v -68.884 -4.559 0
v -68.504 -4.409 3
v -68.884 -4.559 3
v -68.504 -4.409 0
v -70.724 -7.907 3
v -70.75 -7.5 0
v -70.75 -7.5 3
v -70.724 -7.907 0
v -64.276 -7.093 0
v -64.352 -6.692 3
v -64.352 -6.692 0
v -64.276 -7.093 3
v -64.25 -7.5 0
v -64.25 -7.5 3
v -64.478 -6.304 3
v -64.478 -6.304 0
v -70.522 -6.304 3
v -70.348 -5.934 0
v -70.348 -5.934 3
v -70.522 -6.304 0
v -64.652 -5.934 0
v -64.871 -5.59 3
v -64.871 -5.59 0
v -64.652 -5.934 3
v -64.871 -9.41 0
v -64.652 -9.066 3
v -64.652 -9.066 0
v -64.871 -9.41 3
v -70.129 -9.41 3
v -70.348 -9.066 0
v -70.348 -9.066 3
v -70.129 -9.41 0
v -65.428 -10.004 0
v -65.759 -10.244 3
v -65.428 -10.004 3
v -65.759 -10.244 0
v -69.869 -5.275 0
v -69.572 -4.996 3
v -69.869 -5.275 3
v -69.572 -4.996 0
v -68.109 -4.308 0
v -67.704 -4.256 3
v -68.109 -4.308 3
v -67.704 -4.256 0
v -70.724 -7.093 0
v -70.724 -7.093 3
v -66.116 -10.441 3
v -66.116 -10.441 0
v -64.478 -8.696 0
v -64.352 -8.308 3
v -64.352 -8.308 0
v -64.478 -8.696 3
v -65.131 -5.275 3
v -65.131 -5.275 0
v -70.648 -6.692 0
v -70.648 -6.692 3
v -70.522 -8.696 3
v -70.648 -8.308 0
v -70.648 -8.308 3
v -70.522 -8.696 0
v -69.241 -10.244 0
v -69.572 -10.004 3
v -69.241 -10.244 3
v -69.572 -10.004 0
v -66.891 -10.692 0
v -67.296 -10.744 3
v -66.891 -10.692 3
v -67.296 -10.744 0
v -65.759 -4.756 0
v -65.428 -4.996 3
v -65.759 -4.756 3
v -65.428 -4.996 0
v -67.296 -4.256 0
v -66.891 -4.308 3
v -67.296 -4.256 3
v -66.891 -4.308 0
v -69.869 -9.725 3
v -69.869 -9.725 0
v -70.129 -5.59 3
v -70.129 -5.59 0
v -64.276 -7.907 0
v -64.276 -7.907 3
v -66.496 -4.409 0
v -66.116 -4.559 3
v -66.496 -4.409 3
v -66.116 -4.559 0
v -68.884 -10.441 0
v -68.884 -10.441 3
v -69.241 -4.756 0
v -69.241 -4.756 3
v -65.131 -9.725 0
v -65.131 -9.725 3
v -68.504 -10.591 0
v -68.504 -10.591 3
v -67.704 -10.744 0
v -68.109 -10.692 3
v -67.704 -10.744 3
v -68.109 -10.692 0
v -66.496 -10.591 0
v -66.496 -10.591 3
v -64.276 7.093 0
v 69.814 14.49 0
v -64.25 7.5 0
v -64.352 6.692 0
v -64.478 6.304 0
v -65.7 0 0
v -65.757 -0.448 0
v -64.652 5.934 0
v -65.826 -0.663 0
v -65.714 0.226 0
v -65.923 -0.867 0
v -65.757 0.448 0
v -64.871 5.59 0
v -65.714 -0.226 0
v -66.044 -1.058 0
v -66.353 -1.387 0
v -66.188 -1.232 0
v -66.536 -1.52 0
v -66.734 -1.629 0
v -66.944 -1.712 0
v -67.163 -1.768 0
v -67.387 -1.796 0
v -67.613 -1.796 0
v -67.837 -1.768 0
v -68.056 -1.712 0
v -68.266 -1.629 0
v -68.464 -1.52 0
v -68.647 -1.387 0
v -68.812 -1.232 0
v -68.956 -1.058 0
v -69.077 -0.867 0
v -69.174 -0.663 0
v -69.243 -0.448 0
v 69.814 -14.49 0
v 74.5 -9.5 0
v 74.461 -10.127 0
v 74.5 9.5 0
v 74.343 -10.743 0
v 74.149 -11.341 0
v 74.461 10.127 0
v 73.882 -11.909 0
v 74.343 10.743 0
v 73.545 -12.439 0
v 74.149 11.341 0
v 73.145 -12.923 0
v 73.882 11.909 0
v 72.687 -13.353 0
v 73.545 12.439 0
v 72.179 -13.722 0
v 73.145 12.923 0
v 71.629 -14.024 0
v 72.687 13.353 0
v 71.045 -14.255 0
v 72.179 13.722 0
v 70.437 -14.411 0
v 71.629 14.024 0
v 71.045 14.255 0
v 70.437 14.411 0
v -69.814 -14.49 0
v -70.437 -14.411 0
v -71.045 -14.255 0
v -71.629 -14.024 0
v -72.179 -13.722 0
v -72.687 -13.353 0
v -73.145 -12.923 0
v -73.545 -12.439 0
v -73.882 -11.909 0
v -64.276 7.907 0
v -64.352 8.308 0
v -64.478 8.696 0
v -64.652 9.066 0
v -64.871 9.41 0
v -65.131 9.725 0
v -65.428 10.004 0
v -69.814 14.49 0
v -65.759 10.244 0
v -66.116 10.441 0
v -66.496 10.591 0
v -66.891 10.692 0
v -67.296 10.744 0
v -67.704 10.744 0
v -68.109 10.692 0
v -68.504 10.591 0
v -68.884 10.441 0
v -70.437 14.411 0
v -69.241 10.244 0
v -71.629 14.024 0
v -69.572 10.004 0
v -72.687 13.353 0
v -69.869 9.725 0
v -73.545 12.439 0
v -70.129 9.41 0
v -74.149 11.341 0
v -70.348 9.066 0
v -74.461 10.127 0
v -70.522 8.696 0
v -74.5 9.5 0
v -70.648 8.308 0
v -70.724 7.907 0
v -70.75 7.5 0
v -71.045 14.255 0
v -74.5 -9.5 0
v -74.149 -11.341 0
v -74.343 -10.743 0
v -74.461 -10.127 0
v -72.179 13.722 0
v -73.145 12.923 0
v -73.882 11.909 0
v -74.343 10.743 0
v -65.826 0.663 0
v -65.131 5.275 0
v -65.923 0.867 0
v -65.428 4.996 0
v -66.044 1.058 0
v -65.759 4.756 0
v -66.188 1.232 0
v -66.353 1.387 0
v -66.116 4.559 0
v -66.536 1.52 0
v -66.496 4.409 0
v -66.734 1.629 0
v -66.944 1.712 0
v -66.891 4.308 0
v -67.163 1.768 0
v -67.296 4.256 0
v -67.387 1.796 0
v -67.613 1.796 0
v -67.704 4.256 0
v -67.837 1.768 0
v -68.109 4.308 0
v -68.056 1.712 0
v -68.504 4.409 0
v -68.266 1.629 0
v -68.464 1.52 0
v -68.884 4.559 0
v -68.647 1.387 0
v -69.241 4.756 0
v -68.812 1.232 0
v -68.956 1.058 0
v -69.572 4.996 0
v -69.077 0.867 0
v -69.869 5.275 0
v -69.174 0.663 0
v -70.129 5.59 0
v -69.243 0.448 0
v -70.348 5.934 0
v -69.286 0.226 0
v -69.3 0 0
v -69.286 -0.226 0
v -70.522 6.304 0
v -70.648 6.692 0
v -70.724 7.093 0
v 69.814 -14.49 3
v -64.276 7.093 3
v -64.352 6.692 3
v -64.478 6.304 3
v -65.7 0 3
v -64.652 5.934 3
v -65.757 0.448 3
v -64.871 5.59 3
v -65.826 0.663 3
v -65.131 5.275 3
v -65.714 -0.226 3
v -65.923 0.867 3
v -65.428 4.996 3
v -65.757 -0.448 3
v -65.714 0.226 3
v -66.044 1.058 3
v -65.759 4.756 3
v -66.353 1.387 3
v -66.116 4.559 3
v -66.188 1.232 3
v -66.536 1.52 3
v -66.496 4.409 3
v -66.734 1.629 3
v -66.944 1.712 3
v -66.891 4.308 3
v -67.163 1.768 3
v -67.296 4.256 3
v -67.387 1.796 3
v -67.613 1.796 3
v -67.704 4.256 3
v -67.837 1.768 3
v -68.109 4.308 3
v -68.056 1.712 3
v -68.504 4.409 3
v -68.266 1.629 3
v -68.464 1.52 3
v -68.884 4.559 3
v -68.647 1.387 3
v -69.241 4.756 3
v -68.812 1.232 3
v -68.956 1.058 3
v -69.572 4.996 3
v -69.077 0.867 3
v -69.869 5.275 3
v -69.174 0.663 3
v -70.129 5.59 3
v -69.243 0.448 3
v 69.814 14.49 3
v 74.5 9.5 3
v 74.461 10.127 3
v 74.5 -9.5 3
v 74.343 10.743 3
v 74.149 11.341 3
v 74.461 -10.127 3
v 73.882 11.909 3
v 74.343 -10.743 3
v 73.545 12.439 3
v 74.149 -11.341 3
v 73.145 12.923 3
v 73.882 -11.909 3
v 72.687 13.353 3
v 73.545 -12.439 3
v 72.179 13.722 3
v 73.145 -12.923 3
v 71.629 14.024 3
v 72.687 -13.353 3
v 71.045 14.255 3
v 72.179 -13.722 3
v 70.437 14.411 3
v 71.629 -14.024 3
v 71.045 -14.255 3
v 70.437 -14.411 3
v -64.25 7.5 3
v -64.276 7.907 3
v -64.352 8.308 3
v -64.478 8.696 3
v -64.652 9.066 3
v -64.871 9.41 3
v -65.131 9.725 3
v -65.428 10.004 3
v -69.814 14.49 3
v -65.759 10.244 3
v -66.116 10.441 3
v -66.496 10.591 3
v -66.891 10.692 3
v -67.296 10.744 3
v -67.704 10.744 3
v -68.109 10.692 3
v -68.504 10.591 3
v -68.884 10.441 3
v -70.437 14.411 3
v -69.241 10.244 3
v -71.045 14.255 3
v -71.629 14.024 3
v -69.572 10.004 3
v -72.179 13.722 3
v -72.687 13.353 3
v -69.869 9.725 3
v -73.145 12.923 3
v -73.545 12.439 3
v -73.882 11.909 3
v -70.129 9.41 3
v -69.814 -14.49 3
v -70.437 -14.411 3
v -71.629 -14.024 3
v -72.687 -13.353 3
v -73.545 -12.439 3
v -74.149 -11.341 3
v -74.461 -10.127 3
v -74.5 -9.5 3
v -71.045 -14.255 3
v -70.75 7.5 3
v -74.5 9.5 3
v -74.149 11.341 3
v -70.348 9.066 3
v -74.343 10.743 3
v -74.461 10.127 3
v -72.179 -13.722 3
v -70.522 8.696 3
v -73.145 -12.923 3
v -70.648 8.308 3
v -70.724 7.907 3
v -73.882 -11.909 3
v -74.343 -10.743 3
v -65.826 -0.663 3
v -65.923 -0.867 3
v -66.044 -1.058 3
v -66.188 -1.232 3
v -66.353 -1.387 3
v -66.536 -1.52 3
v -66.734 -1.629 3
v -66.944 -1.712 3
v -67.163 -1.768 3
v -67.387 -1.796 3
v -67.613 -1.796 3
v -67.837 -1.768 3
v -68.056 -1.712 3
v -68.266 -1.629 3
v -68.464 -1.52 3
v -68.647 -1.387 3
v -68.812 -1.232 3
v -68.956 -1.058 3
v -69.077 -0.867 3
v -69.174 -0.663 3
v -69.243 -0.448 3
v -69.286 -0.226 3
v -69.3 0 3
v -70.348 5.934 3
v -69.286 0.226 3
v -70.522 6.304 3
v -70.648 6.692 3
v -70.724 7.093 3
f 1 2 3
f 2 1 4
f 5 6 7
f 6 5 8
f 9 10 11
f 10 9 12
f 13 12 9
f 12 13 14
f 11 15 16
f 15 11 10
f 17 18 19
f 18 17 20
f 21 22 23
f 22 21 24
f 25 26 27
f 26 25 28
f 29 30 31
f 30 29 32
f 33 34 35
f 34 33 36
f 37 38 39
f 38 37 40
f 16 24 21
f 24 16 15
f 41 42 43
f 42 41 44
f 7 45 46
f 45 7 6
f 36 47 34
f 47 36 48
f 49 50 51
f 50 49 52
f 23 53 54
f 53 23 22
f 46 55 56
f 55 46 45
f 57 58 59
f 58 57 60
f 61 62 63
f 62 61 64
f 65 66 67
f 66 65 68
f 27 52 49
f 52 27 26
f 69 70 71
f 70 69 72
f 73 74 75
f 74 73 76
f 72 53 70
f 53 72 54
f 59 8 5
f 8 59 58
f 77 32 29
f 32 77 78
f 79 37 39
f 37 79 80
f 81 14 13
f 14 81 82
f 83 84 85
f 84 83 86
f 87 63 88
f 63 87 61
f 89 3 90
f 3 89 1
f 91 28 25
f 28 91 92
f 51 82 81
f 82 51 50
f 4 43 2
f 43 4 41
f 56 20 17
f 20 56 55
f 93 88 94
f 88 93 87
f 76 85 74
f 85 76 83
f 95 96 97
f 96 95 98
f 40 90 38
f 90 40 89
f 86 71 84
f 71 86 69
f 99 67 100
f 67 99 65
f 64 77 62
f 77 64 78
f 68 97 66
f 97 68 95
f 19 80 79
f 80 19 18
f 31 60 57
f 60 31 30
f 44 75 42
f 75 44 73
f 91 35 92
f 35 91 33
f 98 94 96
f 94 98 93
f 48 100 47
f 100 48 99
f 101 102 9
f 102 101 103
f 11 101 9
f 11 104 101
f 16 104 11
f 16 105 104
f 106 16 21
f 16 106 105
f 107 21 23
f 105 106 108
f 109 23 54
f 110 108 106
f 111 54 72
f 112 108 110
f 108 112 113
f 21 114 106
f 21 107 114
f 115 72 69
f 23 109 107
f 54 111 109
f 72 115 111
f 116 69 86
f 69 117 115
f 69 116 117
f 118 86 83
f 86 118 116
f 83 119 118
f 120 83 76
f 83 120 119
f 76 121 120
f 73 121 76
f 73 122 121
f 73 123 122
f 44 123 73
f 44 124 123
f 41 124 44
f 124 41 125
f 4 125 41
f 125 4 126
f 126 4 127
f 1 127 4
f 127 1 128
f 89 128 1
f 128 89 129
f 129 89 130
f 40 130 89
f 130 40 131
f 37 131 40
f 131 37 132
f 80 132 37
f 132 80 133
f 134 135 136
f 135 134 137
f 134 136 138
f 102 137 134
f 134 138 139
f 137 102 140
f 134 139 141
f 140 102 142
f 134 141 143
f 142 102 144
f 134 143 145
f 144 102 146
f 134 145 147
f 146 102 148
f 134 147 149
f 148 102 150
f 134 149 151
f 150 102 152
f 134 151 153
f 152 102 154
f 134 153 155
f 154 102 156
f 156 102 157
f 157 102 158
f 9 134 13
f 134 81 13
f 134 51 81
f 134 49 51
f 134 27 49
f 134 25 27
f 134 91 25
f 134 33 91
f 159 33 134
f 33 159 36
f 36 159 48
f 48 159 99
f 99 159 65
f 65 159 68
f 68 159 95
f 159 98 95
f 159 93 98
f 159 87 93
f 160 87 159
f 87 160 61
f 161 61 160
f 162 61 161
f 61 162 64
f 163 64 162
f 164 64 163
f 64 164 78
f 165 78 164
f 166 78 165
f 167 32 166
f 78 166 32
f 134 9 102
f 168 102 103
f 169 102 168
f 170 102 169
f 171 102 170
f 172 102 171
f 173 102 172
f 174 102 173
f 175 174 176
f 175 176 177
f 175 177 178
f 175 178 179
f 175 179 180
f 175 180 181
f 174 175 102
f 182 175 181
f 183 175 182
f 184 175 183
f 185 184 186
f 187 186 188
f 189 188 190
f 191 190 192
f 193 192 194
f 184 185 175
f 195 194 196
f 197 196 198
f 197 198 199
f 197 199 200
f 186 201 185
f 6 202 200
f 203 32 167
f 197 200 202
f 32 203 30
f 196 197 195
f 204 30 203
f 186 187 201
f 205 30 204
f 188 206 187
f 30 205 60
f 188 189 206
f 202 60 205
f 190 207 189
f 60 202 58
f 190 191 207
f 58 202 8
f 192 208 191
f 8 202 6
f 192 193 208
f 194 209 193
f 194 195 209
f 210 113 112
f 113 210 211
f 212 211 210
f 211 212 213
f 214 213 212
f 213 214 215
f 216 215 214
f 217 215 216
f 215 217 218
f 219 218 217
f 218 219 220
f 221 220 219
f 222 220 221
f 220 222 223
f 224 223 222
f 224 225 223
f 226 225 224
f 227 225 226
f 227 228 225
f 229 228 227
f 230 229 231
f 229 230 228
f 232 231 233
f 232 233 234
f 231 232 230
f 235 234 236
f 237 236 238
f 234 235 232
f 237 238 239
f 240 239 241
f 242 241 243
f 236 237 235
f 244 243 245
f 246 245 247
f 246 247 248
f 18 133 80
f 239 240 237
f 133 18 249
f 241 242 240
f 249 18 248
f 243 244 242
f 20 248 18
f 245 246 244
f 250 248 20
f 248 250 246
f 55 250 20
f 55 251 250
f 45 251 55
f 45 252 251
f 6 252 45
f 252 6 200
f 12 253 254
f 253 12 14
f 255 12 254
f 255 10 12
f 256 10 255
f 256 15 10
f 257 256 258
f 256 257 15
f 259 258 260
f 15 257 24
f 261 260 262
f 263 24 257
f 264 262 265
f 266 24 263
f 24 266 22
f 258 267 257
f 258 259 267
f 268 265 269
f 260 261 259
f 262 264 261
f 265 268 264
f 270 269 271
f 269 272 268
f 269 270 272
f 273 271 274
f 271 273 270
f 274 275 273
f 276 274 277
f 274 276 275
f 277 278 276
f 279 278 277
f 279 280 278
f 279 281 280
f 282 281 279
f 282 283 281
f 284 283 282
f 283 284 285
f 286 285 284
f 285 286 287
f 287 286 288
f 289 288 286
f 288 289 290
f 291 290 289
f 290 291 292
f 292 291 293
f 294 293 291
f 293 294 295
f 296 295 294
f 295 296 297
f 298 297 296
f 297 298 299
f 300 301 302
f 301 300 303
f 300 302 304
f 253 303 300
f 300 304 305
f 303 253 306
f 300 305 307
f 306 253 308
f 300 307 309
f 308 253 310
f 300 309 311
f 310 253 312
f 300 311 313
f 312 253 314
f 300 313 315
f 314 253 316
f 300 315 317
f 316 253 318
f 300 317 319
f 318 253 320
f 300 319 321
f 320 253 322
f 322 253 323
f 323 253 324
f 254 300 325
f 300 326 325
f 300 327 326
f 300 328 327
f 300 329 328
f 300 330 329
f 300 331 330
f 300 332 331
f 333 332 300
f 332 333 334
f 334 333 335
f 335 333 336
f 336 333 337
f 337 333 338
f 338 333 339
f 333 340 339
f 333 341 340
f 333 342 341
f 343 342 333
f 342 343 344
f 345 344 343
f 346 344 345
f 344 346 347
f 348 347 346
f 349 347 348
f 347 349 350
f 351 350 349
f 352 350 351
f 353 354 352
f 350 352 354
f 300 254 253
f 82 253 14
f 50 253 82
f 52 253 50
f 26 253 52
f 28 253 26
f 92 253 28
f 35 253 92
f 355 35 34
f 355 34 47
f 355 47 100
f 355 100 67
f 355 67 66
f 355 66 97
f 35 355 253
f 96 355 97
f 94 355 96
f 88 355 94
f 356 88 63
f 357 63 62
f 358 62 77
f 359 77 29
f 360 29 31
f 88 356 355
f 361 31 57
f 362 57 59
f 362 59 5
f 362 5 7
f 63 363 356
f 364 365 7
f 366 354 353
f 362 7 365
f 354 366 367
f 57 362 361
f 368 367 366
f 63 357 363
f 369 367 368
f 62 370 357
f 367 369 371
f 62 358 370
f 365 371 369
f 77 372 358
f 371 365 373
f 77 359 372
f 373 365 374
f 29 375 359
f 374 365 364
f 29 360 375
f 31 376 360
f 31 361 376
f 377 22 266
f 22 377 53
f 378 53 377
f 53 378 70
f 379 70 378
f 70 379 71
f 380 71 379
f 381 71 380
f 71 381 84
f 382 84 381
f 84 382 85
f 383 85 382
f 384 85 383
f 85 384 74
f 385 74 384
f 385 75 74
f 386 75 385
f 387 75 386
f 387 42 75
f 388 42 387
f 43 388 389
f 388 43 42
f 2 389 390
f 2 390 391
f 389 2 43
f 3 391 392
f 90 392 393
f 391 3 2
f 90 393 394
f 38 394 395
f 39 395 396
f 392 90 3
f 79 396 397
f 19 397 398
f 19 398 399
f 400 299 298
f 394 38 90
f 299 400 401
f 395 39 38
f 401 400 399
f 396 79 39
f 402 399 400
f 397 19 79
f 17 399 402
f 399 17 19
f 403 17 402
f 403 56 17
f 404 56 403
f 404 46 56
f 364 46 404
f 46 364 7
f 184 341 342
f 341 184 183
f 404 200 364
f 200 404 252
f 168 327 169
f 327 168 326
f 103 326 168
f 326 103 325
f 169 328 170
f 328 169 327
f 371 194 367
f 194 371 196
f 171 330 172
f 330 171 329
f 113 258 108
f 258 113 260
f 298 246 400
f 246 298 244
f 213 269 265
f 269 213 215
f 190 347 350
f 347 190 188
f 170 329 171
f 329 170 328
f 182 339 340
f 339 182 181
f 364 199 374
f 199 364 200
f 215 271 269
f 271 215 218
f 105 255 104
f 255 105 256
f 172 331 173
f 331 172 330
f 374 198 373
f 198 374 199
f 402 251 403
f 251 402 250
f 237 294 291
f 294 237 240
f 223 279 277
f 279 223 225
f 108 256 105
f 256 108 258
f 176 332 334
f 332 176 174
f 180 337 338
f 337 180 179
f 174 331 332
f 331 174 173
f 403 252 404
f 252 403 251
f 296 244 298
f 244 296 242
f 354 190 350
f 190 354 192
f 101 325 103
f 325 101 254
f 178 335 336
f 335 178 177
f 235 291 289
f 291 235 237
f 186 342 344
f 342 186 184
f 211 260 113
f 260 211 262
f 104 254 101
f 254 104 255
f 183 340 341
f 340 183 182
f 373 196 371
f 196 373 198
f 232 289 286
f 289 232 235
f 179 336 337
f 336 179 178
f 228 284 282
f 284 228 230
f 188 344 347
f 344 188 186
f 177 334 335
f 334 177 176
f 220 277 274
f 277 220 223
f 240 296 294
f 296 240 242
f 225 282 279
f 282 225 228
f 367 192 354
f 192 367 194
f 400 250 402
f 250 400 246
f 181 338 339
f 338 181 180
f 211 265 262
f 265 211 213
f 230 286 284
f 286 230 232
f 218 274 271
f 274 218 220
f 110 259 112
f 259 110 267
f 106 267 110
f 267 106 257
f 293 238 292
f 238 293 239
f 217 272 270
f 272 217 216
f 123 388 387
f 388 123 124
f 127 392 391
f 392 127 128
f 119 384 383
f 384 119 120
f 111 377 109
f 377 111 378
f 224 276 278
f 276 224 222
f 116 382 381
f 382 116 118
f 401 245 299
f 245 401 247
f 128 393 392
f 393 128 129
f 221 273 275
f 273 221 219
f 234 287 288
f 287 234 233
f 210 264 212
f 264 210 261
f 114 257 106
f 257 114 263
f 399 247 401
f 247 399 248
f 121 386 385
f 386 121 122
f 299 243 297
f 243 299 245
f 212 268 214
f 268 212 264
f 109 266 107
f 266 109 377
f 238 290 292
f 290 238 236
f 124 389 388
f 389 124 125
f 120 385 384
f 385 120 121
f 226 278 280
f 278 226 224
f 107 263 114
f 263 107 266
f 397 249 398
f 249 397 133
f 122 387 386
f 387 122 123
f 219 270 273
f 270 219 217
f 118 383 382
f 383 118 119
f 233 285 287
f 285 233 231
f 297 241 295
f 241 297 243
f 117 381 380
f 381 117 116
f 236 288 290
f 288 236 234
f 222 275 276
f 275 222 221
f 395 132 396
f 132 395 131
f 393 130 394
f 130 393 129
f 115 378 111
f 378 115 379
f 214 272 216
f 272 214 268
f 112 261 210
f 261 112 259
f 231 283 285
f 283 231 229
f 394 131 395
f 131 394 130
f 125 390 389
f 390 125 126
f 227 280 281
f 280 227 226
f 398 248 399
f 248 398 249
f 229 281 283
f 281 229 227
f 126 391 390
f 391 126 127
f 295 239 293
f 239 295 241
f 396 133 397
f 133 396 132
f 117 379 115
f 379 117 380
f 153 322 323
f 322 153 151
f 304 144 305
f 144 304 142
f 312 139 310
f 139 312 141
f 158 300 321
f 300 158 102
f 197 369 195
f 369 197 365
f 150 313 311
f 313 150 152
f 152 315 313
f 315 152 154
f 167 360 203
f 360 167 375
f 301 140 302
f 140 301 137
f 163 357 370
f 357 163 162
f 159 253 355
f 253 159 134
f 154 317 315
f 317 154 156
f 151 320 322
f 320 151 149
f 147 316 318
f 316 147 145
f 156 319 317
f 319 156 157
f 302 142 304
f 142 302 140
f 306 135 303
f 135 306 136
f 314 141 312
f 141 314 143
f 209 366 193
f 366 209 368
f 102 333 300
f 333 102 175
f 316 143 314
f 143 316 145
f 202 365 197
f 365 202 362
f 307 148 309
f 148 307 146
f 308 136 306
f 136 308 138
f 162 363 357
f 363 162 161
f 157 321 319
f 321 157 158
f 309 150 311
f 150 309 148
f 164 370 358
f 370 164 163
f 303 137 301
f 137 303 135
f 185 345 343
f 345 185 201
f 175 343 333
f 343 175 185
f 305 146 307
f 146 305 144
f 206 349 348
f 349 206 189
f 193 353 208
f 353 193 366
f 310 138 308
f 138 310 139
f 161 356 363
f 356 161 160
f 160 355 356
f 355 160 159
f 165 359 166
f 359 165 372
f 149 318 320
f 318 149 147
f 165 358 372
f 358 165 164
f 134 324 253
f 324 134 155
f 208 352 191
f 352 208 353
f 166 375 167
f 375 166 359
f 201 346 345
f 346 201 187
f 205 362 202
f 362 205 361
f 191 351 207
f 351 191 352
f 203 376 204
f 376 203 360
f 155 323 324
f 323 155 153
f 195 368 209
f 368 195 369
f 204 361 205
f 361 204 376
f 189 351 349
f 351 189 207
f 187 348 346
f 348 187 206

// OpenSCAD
$fn = 50;


difference() {
	union() {
		hull() {
			translate(v = [-69.5000000000, 9.5000000000, 0]) {
				cylinder(h = 3, r = 5);
			}
			translate(v = [69.5000000000, 9.5000000000, 0]) {
				cylinder(h = 3, r = 5);
			}
			translate(v = [-69.5000000000, -9.5000000000, 0]) {
				cylinder(h = 3, r = 5);
			}
			translate(v = [69.5000000000, -9.5000000000, 0]) {
				cylinder(h = 3, r = 5);
			}
		}
	}
	union() {
		translate(v = [-67.5000000000, -7.5000000000, 0]) {
			cylinder(h = 3, r = 3.2500000000);
		}
		translate(v = [-67.5000000000, 7.5000000000, 0]) {
			cylinder(h = 3, r = 3.2500000000);
		}
		translate(v = [-67.5000000000, -7.5000000000, 0]) {
			cylinder(h = 3, r = 1.8000000000);
		}
		translate(v = [-67.5000000000, 0.0000000000, 0]) {
			cylinder(h = 3, r = 1.8000000000);
		}
		translate(v = [-67.5000000000, 7.5000000000, 0]) {
			cylinder(h = 3, r = 1.8000000000);
		}
		translate(v = [-67.5000000000, -7.5000000000, 0]) {
			cylinder(h = 3, r = 1.8000000000);
		}
		translate(v = [-67.5000000000, 0.0000000000, 0]) {
			cylinder(h = 3, r = 1.8000000000);
		}
		translate(v = [-67.5000000000, 7.5000000000, 0]) {
			cylinder(h = 3, r = 1.8000000000);
		}
		translate(v = [-67.5000000000, -7.5000000000, 0]) {
			cylinder(h = 3, r = 1.8000000000);
		}
		translate(v = [-67.5000000000, 0.0000000000, 0]) {
			cylinder(h = 3, r = 1.8000000000);
		}
		translate(v = [-67.5000000000, 7.5000000000, 0]) {
			cylinder(h = 3, r = 1.8000000000);
		}
	}
}
